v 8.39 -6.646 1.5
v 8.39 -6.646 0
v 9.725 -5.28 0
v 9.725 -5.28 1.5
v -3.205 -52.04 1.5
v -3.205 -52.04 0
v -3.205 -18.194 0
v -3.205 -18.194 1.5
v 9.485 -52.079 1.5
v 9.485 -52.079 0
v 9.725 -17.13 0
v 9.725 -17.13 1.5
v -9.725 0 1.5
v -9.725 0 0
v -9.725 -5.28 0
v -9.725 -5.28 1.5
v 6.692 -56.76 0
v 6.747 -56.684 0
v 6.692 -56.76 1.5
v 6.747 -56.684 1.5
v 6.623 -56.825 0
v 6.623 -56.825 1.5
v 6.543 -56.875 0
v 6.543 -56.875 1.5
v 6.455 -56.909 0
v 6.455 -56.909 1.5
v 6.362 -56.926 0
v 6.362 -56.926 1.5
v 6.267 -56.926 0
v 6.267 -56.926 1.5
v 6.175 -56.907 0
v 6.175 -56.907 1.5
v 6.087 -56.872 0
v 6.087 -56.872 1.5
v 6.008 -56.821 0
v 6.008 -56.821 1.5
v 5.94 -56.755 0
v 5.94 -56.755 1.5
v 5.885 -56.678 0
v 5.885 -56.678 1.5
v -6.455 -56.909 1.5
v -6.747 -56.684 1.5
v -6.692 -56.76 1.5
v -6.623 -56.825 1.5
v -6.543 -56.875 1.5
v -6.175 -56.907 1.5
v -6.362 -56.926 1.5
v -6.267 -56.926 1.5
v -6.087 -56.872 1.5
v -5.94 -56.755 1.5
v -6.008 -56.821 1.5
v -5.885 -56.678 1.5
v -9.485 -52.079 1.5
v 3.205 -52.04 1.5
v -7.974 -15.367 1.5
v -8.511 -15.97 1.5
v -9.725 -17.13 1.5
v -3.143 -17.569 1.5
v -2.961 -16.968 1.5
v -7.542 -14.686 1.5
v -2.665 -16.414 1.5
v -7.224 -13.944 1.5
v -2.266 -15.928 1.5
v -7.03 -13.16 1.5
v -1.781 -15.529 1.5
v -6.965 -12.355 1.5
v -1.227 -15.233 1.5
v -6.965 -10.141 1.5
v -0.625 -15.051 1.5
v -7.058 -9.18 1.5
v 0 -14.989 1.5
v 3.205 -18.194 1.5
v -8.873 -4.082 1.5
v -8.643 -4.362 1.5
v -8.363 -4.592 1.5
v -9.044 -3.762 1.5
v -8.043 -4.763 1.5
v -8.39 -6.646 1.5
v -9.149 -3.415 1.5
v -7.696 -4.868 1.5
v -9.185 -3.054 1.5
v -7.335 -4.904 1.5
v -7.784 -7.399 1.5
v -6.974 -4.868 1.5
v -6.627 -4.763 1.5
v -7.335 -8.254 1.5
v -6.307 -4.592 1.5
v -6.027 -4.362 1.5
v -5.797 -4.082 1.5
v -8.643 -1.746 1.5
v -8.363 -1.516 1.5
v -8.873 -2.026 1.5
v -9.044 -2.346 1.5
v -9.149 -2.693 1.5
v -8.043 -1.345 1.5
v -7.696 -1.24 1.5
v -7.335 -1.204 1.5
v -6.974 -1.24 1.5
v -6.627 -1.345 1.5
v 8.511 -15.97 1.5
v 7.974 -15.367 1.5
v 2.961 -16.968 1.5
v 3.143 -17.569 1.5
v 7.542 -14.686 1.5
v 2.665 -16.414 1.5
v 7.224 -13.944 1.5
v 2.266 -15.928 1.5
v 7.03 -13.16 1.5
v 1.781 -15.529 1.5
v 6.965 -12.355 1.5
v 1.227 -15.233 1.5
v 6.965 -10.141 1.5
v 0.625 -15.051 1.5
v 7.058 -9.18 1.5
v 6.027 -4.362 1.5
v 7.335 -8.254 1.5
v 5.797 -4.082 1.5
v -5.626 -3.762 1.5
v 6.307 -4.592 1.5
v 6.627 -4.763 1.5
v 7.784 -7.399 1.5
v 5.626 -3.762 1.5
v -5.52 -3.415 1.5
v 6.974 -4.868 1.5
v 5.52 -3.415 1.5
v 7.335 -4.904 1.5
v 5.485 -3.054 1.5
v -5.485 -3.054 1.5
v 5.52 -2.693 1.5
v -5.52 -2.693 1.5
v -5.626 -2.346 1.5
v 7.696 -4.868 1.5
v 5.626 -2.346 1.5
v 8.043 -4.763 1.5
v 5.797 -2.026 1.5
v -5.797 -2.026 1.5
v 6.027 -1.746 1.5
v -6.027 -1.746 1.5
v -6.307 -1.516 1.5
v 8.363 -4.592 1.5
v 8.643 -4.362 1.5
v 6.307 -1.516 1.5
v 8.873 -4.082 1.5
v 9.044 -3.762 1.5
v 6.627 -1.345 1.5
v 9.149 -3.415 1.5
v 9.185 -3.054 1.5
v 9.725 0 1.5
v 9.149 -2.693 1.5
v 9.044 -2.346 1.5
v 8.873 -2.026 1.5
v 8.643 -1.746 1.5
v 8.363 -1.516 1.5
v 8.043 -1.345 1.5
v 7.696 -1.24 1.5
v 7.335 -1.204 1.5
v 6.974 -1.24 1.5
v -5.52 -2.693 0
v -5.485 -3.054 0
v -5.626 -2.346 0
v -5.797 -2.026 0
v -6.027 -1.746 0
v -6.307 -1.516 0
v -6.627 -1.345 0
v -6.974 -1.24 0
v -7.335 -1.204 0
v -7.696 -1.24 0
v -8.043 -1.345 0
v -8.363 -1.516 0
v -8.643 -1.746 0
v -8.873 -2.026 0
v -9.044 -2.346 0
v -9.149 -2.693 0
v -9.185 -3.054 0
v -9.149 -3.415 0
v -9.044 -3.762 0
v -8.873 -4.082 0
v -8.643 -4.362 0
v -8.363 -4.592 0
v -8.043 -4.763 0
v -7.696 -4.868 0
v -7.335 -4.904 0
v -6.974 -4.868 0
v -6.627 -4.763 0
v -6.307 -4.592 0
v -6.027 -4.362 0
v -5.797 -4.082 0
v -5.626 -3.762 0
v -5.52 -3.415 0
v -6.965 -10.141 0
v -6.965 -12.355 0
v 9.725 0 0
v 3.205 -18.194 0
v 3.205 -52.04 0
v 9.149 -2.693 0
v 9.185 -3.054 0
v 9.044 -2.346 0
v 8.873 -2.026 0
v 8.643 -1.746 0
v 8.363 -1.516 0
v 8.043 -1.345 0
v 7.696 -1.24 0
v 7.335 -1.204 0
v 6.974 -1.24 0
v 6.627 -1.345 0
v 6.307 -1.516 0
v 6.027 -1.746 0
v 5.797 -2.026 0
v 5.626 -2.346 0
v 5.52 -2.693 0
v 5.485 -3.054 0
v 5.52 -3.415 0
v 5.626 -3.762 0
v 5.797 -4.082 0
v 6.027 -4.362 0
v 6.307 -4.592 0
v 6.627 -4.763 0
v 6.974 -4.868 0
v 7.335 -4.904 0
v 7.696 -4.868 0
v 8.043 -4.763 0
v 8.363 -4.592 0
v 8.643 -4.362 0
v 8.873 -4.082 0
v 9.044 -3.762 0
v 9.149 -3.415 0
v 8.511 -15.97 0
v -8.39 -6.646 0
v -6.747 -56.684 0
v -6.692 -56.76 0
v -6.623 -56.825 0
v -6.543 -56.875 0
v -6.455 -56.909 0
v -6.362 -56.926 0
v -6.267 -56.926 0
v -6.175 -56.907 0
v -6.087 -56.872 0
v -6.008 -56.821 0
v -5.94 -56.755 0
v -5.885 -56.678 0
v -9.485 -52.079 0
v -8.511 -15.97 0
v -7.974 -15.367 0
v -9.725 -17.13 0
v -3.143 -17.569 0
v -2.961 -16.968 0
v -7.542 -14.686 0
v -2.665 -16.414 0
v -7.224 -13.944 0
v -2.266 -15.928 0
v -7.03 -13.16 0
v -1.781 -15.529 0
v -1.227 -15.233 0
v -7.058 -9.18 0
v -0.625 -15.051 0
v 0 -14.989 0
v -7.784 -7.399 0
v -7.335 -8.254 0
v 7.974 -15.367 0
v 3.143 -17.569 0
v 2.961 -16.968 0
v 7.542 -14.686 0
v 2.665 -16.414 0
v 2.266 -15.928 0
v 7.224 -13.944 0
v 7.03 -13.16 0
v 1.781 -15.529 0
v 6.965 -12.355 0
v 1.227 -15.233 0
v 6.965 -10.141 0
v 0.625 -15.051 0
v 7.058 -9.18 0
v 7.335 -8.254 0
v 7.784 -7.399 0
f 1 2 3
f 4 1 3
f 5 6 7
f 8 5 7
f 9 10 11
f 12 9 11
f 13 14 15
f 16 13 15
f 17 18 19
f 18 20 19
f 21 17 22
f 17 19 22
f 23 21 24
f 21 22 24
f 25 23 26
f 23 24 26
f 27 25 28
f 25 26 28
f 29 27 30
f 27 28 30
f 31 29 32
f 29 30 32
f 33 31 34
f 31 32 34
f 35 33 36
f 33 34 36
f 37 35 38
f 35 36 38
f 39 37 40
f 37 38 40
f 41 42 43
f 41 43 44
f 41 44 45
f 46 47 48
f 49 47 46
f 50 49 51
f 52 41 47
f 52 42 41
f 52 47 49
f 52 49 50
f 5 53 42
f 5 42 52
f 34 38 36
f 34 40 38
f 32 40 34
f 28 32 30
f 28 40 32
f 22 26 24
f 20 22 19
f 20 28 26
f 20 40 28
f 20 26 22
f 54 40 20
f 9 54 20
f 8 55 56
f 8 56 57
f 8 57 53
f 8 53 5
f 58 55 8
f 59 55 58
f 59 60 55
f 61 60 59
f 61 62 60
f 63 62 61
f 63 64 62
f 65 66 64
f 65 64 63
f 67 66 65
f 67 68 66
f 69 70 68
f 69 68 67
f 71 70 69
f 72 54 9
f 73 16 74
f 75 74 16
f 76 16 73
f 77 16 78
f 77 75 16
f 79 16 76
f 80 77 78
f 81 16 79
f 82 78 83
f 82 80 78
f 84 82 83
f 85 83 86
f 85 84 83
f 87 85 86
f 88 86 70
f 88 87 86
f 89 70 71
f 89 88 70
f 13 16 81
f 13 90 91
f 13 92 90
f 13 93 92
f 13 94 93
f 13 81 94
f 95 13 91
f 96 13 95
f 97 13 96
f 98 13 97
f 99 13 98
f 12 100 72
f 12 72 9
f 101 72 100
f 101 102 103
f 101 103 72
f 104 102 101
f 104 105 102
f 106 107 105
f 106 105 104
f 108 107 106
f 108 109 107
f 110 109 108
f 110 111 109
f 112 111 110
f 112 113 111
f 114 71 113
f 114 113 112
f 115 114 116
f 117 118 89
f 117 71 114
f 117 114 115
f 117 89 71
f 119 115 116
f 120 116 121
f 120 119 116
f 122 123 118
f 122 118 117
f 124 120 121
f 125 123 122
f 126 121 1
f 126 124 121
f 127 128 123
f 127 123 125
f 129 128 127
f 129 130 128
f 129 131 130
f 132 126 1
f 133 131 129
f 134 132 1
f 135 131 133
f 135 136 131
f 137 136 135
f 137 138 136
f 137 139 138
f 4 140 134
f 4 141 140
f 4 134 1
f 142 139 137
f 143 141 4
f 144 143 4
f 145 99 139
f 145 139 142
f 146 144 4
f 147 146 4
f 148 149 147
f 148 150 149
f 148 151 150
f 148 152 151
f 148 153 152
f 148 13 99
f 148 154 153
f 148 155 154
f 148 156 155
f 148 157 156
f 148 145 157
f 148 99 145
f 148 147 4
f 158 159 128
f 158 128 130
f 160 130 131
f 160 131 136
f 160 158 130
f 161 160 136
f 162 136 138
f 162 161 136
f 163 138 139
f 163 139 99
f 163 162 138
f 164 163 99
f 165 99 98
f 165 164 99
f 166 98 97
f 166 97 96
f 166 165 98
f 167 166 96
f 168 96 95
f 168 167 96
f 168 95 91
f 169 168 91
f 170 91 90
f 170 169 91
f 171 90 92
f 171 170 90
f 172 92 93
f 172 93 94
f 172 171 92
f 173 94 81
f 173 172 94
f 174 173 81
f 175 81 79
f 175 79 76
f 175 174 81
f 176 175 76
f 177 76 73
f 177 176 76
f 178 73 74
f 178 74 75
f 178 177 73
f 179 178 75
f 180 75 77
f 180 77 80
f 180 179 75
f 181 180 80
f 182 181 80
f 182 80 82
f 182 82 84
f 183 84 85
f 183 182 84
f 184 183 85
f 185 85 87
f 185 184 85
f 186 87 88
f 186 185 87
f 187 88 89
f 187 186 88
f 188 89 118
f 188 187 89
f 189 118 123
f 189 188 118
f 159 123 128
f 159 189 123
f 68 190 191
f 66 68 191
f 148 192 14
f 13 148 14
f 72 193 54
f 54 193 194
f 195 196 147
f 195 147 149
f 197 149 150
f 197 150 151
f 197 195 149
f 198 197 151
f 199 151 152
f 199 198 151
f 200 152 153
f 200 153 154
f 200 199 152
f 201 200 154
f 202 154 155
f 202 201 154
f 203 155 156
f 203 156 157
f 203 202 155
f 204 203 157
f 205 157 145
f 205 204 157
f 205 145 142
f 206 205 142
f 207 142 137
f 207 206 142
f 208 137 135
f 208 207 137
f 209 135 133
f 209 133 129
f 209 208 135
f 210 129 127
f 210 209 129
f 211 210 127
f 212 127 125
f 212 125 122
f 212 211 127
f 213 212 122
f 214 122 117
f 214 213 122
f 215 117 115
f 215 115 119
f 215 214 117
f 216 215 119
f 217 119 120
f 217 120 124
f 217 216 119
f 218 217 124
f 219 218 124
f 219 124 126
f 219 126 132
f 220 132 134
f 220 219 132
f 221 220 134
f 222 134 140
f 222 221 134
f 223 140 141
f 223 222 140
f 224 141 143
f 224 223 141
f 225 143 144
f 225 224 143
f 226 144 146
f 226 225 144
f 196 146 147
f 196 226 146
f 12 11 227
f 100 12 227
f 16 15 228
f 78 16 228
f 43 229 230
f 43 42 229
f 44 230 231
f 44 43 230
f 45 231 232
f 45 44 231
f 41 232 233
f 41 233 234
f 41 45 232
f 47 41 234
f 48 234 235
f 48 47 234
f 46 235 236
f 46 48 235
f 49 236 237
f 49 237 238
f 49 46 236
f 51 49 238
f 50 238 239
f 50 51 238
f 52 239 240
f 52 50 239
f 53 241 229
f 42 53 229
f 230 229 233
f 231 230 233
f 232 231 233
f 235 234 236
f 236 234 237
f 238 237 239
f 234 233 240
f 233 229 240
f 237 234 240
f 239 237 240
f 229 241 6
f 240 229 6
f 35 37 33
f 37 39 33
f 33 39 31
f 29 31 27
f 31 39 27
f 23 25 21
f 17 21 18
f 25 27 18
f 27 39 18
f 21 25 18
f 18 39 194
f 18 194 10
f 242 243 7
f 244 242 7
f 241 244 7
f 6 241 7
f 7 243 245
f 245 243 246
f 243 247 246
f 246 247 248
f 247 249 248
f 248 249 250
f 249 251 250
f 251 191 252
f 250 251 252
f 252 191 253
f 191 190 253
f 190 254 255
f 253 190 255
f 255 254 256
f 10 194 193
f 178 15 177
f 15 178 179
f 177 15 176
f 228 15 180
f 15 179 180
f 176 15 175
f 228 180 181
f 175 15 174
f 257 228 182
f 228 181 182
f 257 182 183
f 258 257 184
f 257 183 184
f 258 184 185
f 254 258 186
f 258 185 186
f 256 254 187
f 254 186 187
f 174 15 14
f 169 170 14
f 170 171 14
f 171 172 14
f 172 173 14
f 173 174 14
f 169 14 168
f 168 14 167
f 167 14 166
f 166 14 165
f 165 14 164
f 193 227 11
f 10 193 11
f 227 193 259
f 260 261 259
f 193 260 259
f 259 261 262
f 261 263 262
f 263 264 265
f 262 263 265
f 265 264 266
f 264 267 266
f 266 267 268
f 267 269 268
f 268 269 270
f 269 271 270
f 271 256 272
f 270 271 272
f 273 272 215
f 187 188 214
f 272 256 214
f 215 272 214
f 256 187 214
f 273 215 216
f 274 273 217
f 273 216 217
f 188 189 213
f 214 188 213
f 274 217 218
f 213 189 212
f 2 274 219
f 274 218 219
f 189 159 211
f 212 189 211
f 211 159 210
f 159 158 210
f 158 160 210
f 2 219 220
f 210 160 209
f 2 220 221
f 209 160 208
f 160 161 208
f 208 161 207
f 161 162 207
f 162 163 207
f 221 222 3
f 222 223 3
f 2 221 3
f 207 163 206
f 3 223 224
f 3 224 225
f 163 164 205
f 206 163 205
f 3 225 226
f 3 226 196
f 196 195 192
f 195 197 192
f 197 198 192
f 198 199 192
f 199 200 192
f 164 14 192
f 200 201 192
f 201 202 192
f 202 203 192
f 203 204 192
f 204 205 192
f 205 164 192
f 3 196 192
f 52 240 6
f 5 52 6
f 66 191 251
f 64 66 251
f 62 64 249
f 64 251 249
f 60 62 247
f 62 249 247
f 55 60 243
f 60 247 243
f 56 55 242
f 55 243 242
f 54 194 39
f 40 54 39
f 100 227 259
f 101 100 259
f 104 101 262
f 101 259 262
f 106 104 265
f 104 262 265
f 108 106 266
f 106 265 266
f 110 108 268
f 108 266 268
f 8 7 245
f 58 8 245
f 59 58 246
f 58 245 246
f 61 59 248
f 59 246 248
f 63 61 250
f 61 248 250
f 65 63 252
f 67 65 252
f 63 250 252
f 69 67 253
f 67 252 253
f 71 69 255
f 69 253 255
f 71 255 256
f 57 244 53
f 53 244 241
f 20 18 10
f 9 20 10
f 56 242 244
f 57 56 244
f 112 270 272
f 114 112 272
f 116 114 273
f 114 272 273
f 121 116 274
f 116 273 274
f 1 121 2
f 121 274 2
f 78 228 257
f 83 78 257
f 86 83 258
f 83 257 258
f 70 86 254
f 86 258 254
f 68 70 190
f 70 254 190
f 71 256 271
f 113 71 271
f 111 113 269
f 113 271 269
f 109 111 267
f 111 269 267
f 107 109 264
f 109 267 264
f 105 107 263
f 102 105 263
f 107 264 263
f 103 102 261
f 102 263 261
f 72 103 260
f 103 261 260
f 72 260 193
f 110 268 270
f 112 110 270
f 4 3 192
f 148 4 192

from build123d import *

# Parameters (mm, degrees)
F0_R     = 1.85
F1_DEPTH = 1.5
F2_R     = 0.5


with BuildPart() as f1:
    # F0 (on Top) → F1 (new body)
    with BuildSketch(Plane.XY):
        with BuildLine():
            Line((9.725, 0), (0, 0))
            Line((0, 0), (0, -14.989273))
            ThreePointArc((0, -14.989273), (2.266295, -15.928004), (3.205026, -18.194299))
            Line((3.205026, -18.194299), (3.205026, -52.04))
            Line((3.205026, -52.04), (6.311514, -57.417158))
            Line((6.311514, -57.417158), (9.485026, -52.079282))
            Line((9.485026, -52.079282), (9.725, -17.13))
            Line((9.725, -17.13), (8.511168, -15.97041))
            ThreePointArc((8.511168, -15.97041), (7.367764, -14.321087), (6.965, -12.35502))
            Line((6.965, -12.35502), (6.965, -10.141257))
            ThreePointArc((6.965, -10.141257), (7.334825, -8.254069), (8.389591, -6.646053))
            Line((8.389591, -6.646053), (9.725, -5.28))
            Line((9.725, -5.28), (9.725, 0))
        make_face()
        with Locations((7.334825, -3.054033)):
            Circle(F0_R, mode=Mode.SUBTRACT)
        with BuildLine():
            Line((0, -14.989273), (0, 0))
            Line((0, 0), (-9.725, 0))
            Line((-9.725, 0), (-9.725, -5.28))
            Line((-9.725, -5.28), (-8.389591, -6.646053))
            ThreePointArc((-8.389591, -6.646053), (-7.334825, -8.254069), (-6.965, -10.141257))
            Line((-6.965, -10.141257), (-6.965, -12.35502))
            ThreePointArc((-6.965, -12.35502), (-7.367764, -14.321087), (-8.511168, -15.97041))
            Line((-8.511168, -15.97041), (-9.725, -17.13))
            Line((-9.725, -17.13), (-9.485026, -52.079282))
            Line((-9.485026, -52.079282), (-6.311514, -57.417158))
            Line((-6.311514, -57.417158), (-3.205026, -52.04))
            Line((-3.205026, -52.04), (-3.205026, -18.194299))
            ThreePointArc((-3.205026, -18.194299), (-2.266295, -15.928004), (0, -14.989273))
        make_face()
        with Locations((-7.334825, -3.054033)):
            Circle(F0_R, mode=Mode.SUBTRACT)
    extrude(amount=F1_DEPTH)

    # F2
    f2_edges = [f1.edges().sort_by_distance(p)[0] for p in [
        (-6.311514, -57.417158, 0.75),
        (6.311514, -57.417158, 0.75),
    ]]
    fillet(f2_edges, radius=F2_R)


solid = f1.part
